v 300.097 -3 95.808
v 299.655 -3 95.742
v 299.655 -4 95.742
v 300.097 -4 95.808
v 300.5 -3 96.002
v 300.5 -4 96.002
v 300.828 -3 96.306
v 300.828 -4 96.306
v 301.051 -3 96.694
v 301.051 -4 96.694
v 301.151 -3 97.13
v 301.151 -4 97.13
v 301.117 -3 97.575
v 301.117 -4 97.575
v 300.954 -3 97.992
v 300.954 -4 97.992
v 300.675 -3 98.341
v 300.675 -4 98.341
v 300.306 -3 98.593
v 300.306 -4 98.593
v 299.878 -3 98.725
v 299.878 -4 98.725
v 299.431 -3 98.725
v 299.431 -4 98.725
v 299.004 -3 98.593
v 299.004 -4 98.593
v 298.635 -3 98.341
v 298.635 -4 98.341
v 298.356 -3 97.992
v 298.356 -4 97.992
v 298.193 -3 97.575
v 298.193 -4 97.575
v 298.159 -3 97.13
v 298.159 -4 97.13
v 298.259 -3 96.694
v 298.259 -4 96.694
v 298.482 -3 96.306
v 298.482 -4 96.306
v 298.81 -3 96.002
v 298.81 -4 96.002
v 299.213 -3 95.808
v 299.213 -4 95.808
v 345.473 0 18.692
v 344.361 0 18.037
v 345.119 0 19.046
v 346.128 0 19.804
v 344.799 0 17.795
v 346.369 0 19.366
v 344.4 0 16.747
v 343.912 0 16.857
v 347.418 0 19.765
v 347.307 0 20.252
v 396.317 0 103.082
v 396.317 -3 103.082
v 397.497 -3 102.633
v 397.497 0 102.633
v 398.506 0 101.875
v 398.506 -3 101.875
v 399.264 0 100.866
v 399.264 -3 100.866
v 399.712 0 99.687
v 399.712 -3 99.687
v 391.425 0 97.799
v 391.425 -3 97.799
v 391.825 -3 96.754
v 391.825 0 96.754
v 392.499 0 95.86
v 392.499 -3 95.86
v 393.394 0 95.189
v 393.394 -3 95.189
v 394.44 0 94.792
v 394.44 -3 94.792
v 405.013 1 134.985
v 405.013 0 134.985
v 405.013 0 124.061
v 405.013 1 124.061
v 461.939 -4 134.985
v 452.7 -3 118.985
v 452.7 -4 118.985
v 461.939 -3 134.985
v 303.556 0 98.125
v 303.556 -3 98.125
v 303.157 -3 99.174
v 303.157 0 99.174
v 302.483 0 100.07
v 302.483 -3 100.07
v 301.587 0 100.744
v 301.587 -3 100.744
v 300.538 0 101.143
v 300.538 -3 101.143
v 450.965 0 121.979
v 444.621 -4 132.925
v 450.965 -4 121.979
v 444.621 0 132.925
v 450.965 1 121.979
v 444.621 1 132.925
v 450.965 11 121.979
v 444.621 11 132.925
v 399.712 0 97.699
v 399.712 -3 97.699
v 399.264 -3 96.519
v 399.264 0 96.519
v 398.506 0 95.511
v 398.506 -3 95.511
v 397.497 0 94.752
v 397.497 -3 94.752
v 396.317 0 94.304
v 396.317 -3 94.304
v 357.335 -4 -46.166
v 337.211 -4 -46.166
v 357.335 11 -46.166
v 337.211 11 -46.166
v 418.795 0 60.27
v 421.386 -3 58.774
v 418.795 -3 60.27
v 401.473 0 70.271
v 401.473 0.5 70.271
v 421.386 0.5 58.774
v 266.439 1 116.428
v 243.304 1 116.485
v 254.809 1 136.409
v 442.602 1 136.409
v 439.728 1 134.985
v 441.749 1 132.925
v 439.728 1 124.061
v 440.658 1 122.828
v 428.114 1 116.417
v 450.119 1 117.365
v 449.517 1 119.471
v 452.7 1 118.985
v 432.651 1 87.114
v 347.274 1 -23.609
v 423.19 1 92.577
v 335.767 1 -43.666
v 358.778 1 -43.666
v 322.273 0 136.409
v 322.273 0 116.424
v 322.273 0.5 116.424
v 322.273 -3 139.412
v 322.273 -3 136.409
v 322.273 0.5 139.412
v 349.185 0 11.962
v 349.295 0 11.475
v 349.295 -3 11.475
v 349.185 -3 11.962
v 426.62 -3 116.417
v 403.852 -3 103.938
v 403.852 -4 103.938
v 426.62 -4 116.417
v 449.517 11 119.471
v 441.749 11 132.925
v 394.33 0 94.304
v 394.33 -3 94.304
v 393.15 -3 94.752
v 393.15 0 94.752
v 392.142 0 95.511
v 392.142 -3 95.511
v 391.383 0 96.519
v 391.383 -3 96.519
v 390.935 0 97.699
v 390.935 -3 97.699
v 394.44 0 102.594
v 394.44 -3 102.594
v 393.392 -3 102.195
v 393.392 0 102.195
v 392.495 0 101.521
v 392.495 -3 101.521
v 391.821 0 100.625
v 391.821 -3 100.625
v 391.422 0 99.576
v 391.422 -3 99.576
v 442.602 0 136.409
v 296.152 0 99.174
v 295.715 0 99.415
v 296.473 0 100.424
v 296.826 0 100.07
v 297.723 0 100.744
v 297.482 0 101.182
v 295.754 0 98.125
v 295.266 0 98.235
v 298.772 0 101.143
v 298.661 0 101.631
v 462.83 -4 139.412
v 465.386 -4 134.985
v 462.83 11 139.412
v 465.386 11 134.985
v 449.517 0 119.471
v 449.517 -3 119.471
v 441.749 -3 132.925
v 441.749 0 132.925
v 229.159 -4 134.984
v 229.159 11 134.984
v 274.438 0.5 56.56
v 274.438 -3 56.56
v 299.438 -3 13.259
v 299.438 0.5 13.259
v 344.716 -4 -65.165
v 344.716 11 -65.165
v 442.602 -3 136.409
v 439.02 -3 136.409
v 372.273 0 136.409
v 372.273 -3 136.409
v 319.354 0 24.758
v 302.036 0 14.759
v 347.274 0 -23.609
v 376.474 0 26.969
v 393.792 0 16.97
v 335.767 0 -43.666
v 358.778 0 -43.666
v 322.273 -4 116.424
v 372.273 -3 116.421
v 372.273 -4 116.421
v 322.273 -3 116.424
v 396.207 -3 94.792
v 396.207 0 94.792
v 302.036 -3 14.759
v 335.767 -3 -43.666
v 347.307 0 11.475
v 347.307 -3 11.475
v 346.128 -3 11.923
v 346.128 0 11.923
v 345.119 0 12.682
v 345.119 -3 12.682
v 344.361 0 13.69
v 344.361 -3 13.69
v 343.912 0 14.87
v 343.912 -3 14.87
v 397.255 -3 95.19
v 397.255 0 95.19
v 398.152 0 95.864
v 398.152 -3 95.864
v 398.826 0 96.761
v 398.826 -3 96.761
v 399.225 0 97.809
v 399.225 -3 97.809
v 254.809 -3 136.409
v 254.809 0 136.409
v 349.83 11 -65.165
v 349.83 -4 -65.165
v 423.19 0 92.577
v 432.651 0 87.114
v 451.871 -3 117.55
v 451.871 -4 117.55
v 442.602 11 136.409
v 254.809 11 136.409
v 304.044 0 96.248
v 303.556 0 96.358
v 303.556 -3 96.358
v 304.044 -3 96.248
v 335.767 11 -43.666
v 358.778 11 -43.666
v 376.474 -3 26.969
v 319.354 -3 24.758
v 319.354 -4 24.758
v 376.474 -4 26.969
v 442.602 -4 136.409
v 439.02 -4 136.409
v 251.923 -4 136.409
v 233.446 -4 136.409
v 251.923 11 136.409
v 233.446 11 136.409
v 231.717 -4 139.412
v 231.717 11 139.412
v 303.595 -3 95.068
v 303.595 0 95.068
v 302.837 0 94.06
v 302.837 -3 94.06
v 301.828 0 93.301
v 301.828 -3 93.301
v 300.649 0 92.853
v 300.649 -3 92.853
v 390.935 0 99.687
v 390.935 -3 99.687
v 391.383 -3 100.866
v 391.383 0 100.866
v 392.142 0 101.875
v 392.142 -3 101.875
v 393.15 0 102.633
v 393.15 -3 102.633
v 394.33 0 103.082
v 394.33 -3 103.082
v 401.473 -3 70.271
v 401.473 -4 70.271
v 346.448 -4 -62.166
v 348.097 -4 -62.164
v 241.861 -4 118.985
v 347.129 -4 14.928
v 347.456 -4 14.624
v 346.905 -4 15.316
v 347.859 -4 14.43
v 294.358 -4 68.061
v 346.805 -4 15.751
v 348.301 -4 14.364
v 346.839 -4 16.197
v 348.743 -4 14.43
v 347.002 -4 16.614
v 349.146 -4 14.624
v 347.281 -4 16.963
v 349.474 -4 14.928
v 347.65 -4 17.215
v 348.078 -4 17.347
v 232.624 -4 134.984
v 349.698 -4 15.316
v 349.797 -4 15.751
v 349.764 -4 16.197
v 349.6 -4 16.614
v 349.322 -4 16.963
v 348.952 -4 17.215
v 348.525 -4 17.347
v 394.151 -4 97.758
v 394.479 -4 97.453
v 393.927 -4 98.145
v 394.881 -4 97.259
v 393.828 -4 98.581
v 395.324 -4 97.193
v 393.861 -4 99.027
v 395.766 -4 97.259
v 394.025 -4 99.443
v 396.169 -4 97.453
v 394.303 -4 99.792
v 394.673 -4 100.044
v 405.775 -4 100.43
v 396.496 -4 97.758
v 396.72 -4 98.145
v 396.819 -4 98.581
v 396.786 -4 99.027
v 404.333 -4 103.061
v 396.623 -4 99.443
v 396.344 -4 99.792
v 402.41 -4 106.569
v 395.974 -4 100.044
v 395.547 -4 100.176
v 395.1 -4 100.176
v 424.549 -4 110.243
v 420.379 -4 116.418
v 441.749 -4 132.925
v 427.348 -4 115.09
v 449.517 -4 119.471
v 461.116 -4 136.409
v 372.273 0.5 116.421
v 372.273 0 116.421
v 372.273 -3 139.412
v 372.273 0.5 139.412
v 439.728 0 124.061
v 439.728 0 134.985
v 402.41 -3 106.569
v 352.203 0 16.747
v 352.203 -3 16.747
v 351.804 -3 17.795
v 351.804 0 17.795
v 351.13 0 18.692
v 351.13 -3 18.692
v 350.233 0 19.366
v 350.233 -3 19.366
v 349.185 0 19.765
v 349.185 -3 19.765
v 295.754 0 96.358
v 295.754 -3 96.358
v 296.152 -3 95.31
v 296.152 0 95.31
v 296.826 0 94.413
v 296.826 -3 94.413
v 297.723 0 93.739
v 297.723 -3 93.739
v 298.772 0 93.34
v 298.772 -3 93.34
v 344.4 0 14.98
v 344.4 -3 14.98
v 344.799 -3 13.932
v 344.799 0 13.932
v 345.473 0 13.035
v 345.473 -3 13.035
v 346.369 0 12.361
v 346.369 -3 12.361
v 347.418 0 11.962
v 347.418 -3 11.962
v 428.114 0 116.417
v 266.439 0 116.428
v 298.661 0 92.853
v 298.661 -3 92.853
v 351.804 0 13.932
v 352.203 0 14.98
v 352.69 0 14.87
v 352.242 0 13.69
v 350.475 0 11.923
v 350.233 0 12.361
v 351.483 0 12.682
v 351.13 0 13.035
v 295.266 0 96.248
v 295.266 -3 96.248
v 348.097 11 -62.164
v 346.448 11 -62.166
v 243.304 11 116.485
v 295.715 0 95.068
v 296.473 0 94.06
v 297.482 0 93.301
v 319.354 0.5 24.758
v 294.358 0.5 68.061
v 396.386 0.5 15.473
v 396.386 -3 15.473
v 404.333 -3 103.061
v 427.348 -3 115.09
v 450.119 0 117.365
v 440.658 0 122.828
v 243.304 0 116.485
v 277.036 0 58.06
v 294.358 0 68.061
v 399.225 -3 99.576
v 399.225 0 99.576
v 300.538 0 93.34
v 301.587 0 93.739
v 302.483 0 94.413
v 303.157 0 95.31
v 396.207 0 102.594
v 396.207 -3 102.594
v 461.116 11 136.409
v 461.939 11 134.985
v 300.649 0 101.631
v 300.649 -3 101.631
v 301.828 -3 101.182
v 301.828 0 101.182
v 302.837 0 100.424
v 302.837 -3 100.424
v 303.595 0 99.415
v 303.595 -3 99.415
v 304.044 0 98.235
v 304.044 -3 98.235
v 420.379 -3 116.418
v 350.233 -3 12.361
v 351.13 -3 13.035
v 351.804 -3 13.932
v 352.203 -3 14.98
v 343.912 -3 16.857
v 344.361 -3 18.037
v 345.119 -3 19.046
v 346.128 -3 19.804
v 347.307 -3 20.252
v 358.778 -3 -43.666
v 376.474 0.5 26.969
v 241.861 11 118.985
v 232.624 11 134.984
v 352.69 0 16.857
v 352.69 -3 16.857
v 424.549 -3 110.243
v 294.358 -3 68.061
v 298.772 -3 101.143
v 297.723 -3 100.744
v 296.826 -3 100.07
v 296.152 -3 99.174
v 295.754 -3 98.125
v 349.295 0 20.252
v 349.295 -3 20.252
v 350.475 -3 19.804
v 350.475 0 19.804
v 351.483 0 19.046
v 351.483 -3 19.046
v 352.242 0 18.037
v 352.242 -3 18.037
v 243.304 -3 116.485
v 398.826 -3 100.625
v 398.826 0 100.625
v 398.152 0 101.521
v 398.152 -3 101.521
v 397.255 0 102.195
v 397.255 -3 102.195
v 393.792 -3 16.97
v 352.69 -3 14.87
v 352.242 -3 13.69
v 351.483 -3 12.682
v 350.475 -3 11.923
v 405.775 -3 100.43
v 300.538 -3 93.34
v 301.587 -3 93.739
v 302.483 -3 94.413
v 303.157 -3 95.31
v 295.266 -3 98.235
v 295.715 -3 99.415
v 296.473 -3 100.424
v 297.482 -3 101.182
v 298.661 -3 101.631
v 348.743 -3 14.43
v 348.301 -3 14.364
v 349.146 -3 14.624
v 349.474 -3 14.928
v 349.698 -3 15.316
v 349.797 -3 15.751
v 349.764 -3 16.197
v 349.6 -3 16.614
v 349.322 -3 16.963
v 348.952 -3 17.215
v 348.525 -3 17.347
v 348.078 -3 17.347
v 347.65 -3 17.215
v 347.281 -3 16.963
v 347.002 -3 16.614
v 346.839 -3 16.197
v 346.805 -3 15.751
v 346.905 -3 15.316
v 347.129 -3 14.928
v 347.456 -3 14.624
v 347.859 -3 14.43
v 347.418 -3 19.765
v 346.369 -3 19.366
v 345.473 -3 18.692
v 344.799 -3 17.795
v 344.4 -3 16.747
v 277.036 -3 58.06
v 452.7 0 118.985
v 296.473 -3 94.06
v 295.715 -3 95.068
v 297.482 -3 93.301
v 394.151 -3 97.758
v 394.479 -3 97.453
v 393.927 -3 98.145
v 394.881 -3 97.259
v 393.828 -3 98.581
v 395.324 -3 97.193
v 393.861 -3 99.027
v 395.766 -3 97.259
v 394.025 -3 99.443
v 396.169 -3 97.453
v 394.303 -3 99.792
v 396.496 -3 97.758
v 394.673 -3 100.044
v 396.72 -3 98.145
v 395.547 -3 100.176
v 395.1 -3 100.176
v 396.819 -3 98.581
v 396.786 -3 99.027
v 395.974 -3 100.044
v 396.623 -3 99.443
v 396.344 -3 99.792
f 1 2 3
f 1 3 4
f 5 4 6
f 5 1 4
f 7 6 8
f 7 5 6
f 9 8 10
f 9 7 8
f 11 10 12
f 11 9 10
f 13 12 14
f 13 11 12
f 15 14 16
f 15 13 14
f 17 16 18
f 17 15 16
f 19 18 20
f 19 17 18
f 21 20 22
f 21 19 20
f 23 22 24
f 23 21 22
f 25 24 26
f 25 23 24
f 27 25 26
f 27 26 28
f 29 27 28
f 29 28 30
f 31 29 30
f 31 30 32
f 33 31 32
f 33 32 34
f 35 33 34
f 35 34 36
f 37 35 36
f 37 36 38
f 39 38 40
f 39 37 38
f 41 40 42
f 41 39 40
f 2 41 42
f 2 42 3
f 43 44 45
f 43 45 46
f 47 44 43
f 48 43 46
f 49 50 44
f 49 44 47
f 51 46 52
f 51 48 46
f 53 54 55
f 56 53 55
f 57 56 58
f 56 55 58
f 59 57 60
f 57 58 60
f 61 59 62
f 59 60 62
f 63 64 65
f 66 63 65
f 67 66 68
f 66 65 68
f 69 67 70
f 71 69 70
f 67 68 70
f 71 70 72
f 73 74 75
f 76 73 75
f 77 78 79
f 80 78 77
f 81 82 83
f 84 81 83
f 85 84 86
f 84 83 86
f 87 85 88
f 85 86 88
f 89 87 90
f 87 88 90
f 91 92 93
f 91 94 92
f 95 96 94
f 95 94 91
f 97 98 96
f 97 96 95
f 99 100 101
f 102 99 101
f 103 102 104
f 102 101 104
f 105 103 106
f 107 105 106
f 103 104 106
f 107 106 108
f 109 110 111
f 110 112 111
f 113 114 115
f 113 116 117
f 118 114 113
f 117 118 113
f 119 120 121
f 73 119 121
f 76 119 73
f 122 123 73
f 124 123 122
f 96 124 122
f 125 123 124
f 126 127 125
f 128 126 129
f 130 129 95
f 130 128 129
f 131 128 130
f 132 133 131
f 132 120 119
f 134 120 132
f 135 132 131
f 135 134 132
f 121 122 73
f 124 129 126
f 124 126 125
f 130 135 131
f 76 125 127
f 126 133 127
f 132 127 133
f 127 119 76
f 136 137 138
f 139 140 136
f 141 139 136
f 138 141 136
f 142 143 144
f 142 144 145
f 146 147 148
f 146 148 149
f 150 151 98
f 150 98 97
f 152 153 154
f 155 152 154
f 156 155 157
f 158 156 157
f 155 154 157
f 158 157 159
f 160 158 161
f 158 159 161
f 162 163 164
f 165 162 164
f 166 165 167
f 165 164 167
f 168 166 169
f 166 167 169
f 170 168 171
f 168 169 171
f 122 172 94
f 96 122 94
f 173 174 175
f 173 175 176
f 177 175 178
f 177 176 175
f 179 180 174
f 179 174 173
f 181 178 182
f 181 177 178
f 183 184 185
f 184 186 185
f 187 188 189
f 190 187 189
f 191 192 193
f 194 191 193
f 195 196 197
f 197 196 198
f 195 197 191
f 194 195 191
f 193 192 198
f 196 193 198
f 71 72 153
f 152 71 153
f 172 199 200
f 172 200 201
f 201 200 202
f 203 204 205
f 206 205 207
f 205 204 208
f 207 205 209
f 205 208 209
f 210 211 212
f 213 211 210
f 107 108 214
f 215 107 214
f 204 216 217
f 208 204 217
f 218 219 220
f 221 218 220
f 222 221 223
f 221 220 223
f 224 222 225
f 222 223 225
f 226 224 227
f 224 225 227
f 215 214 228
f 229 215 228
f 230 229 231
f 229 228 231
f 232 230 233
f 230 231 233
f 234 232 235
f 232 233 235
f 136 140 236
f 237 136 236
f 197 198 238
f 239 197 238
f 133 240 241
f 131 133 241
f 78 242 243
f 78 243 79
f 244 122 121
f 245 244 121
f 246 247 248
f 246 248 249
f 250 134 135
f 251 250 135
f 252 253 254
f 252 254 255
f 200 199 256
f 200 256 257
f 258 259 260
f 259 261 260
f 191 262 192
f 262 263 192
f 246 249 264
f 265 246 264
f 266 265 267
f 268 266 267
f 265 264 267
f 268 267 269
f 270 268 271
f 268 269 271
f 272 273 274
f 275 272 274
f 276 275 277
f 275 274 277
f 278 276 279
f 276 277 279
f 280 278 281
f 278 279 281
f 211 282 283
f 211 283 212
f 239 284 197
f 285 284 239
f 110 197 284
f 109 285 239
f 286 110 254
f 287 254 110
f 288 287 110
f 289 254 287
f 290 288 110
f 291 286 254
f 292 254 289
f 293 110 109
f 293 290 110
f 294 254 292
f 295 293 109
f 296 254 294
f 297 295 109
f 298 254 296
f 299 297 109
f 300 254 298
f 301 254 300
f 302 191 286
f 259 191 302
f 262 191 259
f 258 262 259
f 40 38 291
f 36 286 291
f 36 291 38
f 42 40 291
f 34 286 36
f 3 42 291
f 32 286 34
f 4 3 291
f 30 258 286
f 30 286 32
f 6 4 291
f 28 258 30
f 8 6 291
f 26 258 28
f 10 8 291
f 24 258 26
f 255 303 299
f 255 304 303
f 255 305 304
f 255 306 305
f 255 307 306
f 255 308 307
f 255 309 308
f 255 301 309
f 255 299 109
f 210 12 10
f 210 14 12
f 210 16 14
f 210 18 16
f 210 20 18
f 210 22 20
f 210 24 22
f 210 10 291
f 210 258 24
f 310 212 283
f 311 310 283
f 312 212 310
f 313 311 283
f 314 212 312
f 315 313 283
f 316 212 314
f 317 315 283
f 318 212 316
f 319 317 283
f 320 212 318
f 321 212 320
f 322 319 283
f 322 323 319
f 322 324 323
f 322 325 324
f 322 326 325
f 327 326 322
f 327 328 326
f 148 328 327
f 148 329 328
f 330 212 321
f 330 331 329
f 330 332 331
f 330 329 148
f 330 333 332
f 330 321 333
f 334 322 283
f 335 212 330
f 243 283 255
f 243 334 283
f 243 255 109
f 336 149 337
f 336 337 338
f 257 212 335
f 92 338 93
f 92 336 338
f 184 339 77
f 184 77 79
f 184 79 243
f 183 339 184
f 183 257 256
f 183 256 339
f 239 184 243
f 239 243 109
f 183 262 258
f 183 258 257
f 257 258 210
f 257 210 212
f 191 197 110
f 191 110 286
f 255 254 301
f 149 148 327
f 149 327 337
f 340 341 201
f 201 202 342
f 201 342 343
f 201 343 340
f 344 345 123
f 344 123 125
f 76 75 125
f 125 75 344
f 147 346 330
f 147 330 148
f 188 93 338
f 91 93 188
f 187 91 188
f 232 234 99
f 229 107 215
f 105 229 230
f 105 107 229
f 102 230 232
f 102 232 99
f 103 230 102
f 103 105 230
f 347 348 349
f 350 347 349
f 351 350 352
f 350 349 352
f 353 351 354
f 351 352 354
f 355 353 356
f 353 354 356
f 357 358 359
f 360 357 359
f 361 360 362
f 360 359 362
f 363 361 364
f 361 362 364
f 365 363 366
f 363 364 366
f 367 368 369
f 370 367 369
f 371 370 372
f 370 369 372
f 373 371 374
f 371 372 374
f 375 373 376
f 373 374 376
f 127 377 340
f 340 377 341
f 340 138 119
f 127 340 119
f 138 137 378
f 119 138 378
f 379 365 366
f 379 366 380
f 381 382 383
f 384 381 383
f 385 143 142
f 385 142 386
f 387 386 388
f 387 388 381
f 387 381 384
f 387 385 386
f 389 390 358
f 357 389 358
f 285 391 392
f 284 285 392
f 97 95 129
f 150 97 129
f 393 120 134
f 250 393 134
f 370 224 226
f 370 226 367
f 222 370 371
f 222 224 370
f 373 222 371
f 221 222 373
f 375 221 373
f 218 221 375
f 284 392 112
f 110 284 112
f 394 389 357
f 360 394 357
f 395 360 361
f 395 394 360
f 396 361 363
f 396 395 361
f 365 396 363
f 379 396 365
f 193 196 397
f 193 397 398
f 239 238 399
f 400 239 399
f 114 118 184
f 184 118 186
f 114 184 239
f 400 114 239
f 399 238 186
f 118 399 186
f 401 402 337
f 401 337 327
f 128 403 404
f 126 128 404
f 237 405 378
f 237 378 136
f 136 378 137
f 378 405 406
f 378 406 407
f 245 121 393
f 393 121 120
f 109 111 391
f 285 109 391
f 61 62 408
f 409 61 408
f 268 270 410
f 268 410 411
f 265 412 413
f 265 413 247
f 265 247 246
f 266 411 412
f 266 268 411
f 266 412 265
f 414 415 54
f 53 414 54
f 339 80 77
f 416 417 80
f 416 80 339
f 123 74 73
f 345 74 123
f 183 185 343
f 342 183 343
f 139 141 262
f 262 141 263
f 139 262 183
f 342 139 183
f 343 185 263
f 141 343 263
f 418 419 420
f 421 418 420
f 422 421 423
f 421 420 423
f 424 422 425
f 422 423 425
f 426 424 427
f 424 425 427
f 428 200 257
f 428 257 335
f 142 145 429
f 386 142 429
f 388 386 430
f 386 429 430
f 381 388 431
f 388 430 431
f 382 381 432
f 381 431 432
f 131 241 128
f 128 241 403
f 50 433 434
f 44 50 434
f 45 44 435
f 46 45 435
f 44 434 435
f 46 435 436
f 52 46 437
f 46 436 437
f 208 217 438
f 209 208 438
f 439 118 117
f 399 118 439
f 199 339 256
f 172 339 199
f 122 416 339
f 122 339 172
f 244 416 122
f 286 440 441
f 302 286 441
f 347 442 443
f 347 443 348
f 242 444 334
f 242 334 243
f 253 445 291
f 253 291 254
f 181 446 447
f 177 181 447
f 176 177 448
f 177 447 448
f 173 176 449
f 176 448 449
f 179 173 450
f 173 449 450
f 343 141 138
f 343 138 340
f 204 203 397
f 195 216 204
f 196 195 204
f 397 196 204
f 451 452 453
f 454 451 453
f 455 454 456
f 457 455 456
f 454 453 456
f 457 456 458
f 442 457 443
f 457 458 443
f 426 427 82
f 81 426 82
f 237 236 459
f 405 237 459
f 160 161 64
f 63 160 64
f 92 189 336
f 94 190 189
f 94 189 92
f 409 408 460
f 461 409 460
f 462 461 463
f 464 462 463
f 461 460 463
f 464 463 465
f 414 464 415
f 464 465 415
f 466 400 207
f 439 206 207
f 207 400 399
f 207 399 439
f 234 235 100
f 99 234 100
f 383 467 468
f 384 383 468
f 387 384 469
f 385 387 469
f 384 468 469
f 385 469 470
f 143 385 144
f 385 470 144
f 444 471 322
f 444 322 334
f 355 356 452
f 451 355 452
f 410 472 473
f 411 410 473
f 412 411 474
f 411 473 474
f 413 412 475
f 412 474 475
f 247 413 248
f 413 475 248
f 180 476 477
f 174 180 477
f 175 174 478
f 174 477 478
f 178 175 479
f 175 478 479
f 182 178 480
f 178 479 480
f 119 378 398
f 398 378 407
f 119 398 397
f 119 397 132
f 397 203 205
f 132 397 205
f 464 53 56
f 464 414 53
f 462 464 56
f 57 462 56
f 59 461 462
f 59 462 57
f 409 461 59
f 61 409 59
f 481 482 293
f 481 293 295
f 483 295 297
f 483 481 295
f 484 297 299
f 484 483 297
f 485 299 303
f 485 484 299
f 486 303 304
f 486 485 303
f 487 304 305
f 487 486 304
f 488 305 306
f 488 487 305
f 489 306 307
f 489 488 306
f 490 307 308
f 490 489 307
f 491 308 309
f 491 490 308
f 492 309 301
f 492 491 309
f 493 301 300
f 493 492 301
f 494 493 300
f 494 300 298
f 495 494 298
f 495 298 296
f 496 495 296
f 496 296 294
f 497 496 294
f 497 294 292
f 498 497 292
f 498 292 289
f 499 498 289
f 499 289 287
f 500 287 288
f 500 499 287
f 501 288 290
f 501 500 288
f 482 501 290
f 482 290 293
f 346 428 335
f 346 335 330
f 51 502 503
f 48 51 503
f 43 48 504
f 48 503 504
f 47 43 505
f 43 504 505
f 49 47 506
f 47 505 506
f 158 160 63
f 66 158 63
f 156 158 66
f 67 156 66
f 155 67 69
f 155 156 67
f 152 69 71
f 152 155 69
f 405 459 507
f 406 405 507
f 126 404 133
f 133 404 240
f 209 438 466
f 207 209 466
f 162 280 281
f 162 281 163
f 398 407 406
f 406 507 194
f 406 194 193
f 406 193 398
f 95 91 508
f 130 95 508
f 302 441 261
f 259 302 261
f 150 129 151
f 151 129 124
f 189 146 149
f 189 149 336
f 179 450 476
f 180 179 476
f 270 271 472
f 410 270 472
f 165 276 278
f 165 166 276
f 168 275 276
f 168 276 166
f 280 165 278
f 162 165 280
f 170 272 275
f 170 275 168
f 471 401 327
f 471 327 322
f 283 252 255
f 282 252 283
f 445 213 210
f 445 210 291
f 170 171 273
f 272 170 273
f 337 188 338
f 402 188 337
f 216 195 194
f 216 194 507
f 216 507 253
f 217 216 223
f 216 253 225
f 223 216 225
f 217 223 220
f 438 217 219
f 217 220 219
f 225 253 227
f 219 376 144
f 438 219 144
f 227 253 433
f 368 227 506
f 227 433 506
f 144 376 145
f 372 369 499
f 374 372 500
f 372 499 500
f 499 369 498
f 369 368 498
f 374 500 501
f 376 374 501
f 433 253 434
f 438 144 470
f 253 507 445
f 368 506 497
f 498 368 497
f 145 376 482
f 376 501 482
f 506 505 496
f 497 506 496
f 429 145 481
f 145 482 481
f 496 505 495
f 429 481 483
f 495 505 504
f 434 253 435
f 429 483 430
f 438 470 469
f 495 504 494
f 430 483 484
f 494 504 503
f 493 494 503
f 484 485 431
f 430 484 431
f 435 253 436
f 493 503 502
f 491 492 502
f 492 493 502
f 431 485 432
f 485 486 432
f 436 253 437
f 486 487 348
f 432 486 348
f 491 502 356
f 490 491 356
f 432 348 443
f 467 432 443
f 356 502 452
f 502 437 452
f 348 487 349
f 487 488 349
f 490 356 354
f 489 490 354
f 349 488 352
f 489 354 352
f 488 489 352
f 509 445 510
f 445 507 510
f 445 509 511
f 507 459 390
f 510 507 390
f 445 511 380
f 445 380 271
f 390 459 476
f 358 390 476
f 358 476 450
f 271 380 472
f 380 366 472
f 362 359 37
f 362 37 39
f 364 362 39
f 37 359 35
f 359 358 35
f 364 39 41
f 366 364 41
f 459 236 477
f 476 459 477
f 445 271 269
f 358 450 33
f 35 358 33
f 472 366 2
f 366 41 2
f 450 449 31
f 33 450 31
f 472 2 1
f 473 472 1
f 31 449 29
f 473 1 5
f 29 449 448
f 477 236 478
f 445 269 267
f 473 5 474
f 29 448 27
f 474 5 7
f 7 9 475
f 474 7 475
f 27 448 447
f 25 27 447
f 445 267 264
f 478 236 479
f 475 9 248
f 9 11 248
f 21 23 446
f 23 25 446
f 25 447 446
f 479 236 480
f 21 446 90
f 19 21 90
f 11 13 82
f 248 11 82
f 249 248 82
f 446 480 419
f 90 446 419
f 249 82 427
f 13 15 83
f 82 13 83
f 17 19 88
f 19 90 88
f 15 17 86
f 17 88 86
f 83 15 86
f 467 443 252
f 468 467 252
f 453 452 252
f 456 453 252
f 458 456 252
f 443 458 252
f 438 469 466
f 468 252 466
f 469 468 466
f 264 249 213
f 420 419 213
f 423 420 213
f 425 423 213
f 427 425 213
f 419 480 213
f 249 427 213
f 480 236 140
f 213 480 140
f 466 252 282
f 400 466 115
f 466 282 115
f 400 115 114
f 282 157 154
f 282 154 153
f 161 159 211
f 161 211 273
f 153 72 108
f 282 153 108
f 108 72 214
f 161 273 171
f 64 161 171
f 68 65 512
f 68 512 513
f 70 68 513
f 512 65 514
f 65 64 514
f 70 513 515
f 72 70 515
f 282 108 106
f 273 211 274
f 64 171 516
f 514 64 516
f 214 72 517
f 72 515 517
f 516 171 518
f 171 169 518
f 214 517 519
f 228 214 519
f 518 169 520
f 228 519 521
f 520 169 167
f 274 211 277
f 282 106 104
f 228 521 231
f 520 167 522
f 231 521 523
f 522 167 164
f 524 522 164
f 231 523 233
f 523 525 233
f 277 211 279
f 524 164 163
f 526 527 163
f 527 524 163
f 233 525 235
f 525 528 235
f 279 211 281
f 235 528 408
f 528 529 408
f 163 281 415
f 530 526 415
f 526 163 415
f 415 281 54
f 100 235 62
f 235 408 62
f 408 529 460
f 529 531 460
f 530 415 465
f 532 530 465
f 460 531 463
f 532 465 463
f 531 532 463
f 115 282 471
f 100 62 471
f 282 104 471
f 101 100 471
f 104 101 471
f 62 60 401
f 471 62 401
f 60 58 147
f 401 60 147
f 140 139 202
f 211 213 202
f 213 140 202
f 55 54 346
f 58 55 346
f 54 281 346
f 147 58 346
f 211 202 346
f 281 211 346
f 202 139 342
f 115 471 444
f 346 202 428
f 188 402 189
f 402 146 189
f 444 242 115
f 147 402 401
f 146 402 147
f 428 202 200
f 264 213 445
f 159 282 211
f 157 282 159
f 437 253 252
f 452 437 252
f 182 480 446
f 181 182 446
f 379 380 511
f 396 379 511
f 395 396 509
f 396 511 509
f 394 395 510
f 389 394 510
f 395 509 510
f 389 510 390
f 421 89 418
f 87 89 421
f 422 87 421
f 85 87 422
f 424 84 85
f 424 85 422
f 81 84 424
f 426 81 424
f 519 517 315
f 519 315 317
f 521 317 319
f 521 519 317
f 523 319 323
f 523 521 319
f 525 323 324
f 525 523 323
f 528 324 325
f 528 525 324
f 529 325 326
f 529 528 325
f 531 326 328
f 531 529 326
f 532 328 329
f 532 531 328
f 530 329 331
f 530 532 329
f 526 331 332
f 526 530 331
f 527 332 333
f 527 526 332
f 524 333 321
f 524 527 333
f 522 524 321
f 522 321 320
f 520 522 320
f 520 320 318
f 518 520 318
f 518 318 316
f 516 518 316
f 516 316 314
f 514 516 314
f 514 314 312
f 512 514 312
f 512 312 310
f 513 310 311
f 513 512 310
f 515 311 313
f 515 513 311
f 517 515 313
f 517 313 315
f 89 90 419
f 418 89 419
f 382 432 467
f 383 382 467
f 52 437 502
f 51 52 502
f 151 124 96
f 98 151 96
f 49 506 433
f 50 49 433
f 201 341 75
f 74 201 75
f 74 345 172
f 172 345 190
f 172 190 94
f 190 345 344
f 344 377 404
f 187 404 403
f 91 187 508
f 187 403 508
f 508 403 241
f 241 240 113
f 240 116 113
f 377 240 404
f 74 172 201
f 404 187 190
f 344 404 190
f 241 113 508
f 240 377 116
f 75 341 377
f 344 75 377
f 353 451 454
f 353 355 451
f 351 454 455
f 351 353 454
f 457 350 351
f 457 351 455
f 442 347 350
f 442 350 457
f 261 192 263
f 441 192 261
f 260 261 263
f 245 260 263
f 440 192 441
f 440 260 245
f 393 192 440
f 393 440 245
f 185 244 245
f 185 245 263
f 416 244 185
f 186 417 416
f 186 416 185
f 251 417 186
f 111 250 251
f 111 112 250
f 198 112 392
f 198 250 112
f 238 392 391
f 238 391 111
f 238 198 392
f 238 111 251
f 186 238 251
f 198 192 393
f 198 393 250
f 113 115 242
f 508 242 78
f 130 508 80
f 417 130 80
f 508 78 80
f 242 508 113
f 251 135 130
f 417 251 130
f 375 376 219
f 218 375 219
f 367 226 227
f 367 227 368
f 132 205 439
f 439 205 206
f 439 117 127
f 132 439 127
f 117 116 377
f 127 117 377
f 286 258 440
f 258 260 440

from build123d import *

# Parameters (mm, degrees)
SKETCH1_W                = 34.714871787
SKETCH1_H                = 10.923666426
BOSS_EXTRUDE1_DEPTH      = 1
BOSS_EXTRUDE2_DEPTH      = 11
BOSS_EXTRUDE3_DEPTH      = 5
BOSS_EXTRUDE3_DEPTH_BACK = 3
SKETCH3_W                = 50
SKETCH3_H                = 7
CUT_EXTRUDE3_DEPTH       = 25
SKETCH5_W                = 50
SKETCH5_H                = 7
CUT_EXTRUDE4_DEPTH       = 25
SKETCH6_W                = 50
SKETCH6_H                = 7
CUT_EXTRUDE5_DEPTH       = 25
SKETCH8_R                = 1.5
BOSS_EXTRUDE5_DEPTH      = 1
BOSS_EXTRUDE10_DEPTH     = 3


with BuildPart() as part:
    # Sketch1 → Boss-Extrude1 (new body)
    with BuildSketch(Plane(origin=(0, 0, 0), x_dir=(1, 0, 0), z_dir=(0, 1, 0))):
        Polygon((243.304219775, -116.484791865), (254.809280577, -136.408896137), (442.602090749, -136.409305398), (444.621046679, -132.925433224), (441.749040748, -132.925433224), (449.516726724, -119.471406458), (450.964695298, -121.978953123), (452.699916622, -118.984688018), (358.778179036, 43.666038065), (335.767496284, 43.666038065), align=None)
        with Locations((422.370878913, -129.522754792)):
            Rectangle(SKETCH1_W, SKETCH1_H, mode=Mode.SUBTRACT)
        Polygon((423.190377512, -92.577472767), (432.651287025, -87.114324326), (450.119365975, -117.364996826), (440.658456462, -122.828145267), align=None, mode=Mode.SUBTRACT)
        Polygon((428.113670919, -116.417164681), (266.439108268, -116.428009237), (347.273609729, 23.609230821), align=None, mode=Mode.SUBTRACT)
    extrude(amount=BOSS_EXTRUDE1_DEPTH)

    # Sketch1<9> → Boss-Extrude2 (add)
    # profile 1 of 2: a face of its own
    with BuildSketch(Plane(origin=(0, 0, 0), x_dir=(1, 0, 0), z_dir=(0, 1, 0))):
        Polygon((229.159432548, -134.984249184), (231.716666588, -139.412373829), (462.829865412, -139.412373829), (465.38624875, -134.984588004), (349.829542096, 65.165499075), (344.716133219, 65.165499075), align=None)
        Polygon((251.922647989, -136.409305399), (233.446303401, -136.408896138), (232.62355396, -134.984217357), (241.860901689, -118.984688018), align=None, mode=Mode.SUBTRACT)
        Polygon((442.602090749, -136.409305398), (254.809280577, -136.408896137), (243.304219775, -116.484791865), (335.767496284, 43.666038065), (358.778179036, 43.666038065), (461.938967958, -134.984588006), (461.116393749, -136.409305398), align=None, mode=Mode.SUBTRACT)
        Polygon((348.096628302, 62.164013367), (357.334800991, 46.166038067), (337.210874326, 46.166038067), (346.44844193, 62.165948237), align=None, mode=Mode.SUBTRACT)
    # profile 2 of 2: a face of its own
    with BuildSketch(Plane(origin=(0, 0, 0), x_dir=(1, 0, 0), z_dir=(0, 1, 0))):
        Polygon((441.749040748, -132.925433224), (444.621046679, -132.925433224), (450.964695298, -121.978953123), (449.516726724, -119.471406458), align=None)
    extrude(amount=BOSS_EXTRUDE2_DEPTH)

    # Sketch1<10> → Boss-Extrude3 (add, two sides: drawn at the far end of the back side and taken through both)
    # profile 1 of 2: a face of its own
    with BuildSketch(Plane(origin=(0, 0, 0), x_dir=(1, 0, 0), z_dir=(0, 1, 0)).offset(-BOSS_EXTRUDE3_DEPTH_BACK)):
        Polygon((229.159432548, -134.984249184), (231.716666588, -139.412373829), (462.829865412, -139.412373829), (465.38624875, -134.984588004), (349.829542096, 65.165499075), (344.716133219, 65.165499075), align=None)
        Polygon((251.922647989, -136.409305399), (233.446303401, -136.408896138), (232.62355396, -134.984217357), (241.860901689, -118.984688018), align=None, mode=Mode.SUBTRACT)
        Polygon((442.602090749, -136.409305398), (254.809280577, -136.408896137), (243.304219775, -116.484791865), (335.767496284, 43.666038065), (358.778179036, 43.666038065), (461.938967958, -134.984588006), (461.116393749, -136.409305398), align=None, mode=Mode.SUBTRACT)
        Polygon((348.096628302, 62.164013367), (357.334800991, 46.166038067), (337.210874326, 46.166038067), (346.44844193, 62.165948237), align=None, mode=Mode.SUBTRACT)
    # profile 2 of 2: a face of its own
    with BuildSketch(Plane(origin=(0, 0, 0), x_dir=(1, 0, 0), z_dir=(0, 1, 0)).offset(-BOSS_EXTRUDE3_DEPTH_BACK)):
        Polygon((441.749040748, -132.925433224), (444.621046679, -132.925433224), (450.964695298, -121.978953123), (449.516726724, -119.471406458), align=None)
    extrude(amount=BOSS_EXTRUDE3_DEPTH + BOSS_EXTRUDE3_DEPTH_BACK)

    # Sketch3 → Cut-Extrude3 (cut)
    with BuildSketch(Plane(origin=(290.589645397, 0, -167.772009994), x_dir=(-0.49999999999998745, 0, -0.8660254037844459), z_dir=(0.8660254037844459, 0, -0.49999999999998745))):
        with Locations((-236.592990632, -3)):
            Rectangle(SKETCH3_W, SKETCH3_H)
    extrude(amount=-CUT_EXTRUDE3_DEPTH, mode=Mode.SUBTRACT)

    # Sketch5 → Cut-Extrude4 (cut)
    with BuildSketch(Plane.XY.offset(139.412373829)):
        with Locations((347.273266, -3)):
            Rectangle(SKETCH5_W, SKETCH5_H)
    extrude(amount=-CUT_EXTRUDE4_DEPTH, mode=Mode.SUBTRACT)

    # Sketch6 → Cut-Extrude5 (cut)
    with BuildSketch(Plane(origin=(230.319375798, 0, 132.975171837), x_dir=(-0.5000006154012504, 0, 0.8660250484820695), z_dir=(-0.8660250484820695, 0, -0.5000006154012504))):
        with Locations((-113.236674799, -3)):
            Rectangle(SKETCH6_W, SKETCH6_H)
    extrude(amount=-CUT_EXTRUDE5_DEPTH, mode=Mode.SUBTRACT)

    # Sketch8 → Boss-Extrude5 (add)
    with BuildSketch(Plane.XZ.offset(3)):
        Polygon((349.829542096, -65.165499075), (465.38624875, 134.984588004), (462.829865412, 139.412373829), (231.716666588, 139.412373829), (229.159432548, 134.984249184), (344.716133219, -65.165499075), align=None)
        with Locations(Location((395.323540807, 98.692824234, 0), (0, 0, 270))):
            Circle(SKETCH8_R, mode=Mode.SUBTRACT)
        with Locations(Location((348.301285091, 15.863526629, 0), (0, 0, 270))):
            Circle(SKETCH8_R, mode=Mode.SUBTRACT)
        with Locations(Location((299.654911442, 97.24168178, 0), (0, 0, 270))):
            Circle(SKETCH8_R, mode=Mode.SUBTRACT)
        Polygon((444.621046679, 132.925433224), (450.964695298, 121.978953123), (449.516726724, 119.471406458), (427.347592194, 115.090208207), (404.33298615, 103.060878104), (405.774939109, 100.430142149), (424.549299543, 110.243170393), (451.871255231, 117.549638152), (452.699916622, 118.984688018), (461.938967958, 134.984588006), (461.116393749, 136.409305398), (442.602090749, 136.409305398), (439.019602541, 136.409297591), (420.379437571, 116.417683466), (402.410382205, 106.568526044), (403.852335164, 103.937790089), (426.620208946, 116.417264857), (441.749040748, 132.925433224), align=None, mode=Mode.SUBTRACT)
        Polygon((322.273266, 116.42426408), (294.358218631, 68.061097964), (319.354499367, 24.757680453), (376.473657316, 26.969372806), (401.47267951, 70.271207531), (372.273266, 116.420910257), align=None, mode=Mode.SUBTRACT)
        Polygon((233.446303401, 136.408896138), (251.922647989, 136.409305399), (241.860901689, 118.984688018), (232.62355396, 134.984217357), align=None, mode=Mode.SUBTRACT)
        Polygon((337.210874326, -46.166038067), (357.334800991, -46.166038067), (348.096628302, -62.164013367), (346.44844193, -62.165948237), align=None, mode=Mode.SUBTRACT)
    extrude(amount=BOSS_EXTRUDE5_DEPTH)

    # Sketch12 → Boss-Extrude10 (add)
    with BuildSketch(Plane(origin=(0, -3, 0), x_dir=(1, 0, 0), z_dir=(0, 1, 0))):
        with BuildLine():
            Line((347.417900211, -11.962292061), (347.307477101, -11.47463774))
            ThreePointArc((347.307477101, -11.47463774), (345.119304576, -12.681546114), (343.912396202, -14.869718639))
            Line((343.912396203, -14.869718639), (344.400050524, -14.980141749))
            ThreePointArc((344.400050523, -14.980141749), (345.472857967, -13.035099504), (347.417900211, -11.962292061))
        make_face()
        with BuildLine():
            ThreePointArc((352.690173981, -14.869718639), (351.483265607, -12.681546114), (349.295093082, -11.47463774))
            Line((349.295093081, -11.47463774), (349.184669971, -11.962292061))
            ThreePointArc((349.184669972, -11.962292061), (351.129712216, -13.035099504), (352.20251966, -14.980141749))
            Line((352.202519659, -14.980141749), (352.69017398, -14.869718639))
        make_face()
        with BuildLine():
            ThreePointArc((349.295093082, -20.252415518), (351.483265607, -19.045507145), (352.690173981, -16.857334619))
            Line((352.69017398, -16.857334619), (352.202519659, -16.746911509))
            ThreePointArc((352.20251966, -16.746911509), (351.129712216, -18.691953754), (349.184669972, -19.764761197))
            Line((349.184669971, -19.764761197), (349.295093081, -20.252415518))
        make_face()
        with BuildLine():
            Line((344.400050524, -16.746911509), (343.912396203, -16.857334619))
            ThreePointArc((343.912396202, -16.857334619), (345.119304576, -19.045507145), (347.307477101, -20.252415518))
            Line((347.307477101, -20.252415518), (347.417900211, -19.764761197))
            ThreePointArc((347.417900211, -19.764761197), (345.472857967, -18.691953754), (344.400050523, -16.746911509))
        make_face()
        with BuildLine():
            Line((394.440155927, -94.791589666), (394.329732817, -94.303935345))
            ThreePointArc((394.329732817, -94.303935345), (392.141560292, -95.510843718), (390.934651918, -97.699016244))
            Line((390.934651918, -97.699016244), (391.4247896, -97.798542945))
            ThreePointArc((391.4247896, -97.798542945), (392.499067689, -95.860448622), (394.440155927, -94.791589666))
        make_face()
        with BuildLine():
            ThreePointArc((399.712429696, -97.699016244), (398.505521323, -95.510843718), (396.317348797, -94.303935345))
            Line((396.317348797, -94.303935345), (396.206925687, -94.791589666))
            ThreePointArc((396.206925687, -94.791589666), (398.151967932, -95.864397109), (399.224775375, -97.809439354))
            Line((399.224775375, -97.809439354), (399.712429696, -97.699016244))
        make_face()
        with BuildLine():
            ThreePointArc((396.317348797, -103.081713123), (398.505521323, -101.874804749), (399.712429696, -99.686632224))
            Line((399.712429696, -99.686632224), (399.224775375, -99.576209114))
            ThreePointArc((399.224775375, -99.576209114), (398.151967932, -101.521251358), (396.206925687, -102.594058802))
            Line((396.206925687, -102.594058801), (396.317348797, -103.081713122))
        make_face()
        with BuildLine():
            Line((391.422306239, -99.576209114), (390.934651918, -99.686632224))
            ThreePointArc((390.934651918, -99.686632224), (392.141560292, -101.874804749), (394.329732817, -103.081713123))
            Line((394.329732817, -103.081713122), (394.440155927, -102.594058801))
            ThreePointArc((394.440155927, -102.594058802), (392.495113682, -101.521251358), (391.422306239, -99.576209114))
        make_face()
        with BuildLine():
            ThreePointArc((298.661103452, -92.852792892), (296.472930927, -94.059701265), (295.266022553, -96.24787379))
            Line((295.266022553, -96.24787379), (295.753676874, -96.3582969))
            ThreePointArc((295.753676874, -96.3582969), (296.826484317, -94.413254656), (298.771526562, -93.340447213))
            Line((298.771526562, -93.340447212), (298.661103452, -92.852792891))
        make_face()
        with BuildLine():
            ThreePointArc((304.04380033, -96.24787379), (302.836891957, -94.059701265), (300.648719432, -92.852792892))
            Line((300.648719432, -92.852792891), (300.538296322, -93.340447212))
            ThreePointArc((300.538296322, -93.340447213), (302.483338566, -94.413254656), (303.55614601, -96.3582969))
            Line((303.55614601, -96.3582969), (304.043800331, -96.24787379))
        make_face()
        with BuildLine():
            Line((300.538296322, -101.142916348), (300.648719432, -101.630570669))
            ThreePointArc((300.648719432, -101.630570669), (302.836891957, -100.423662295), (304.04380033, -98.23548977))
            Line((304.043800331, -98.23548977), (303.55614601, -98.12506666))
            ThreePointArc((303.55614601, -98.12506666), (302.483338566, -100.070108905), (300.538296322, -101.142916348))
        make_face()
        with BuildLine():
            Line((295.753676874, -98.12506666), (295.266022553, -98.23548977))
            ThreePointArc((295.266022553, -98.23548977), (296.472930927, -100.423662295), (298.661103452, -101.630570669))
            Line((298.661103452, -101.630570669), (298.771526562, -101.142916348))
            ThreePointArc((298.771526562, -101.142916348), (296.826484317, -100.070108905), (295.753676874, -98.12506666))
        make_face()
    extrude(amount=BOSS_EXTRUDE10_DEPTH)


solid = part.part
